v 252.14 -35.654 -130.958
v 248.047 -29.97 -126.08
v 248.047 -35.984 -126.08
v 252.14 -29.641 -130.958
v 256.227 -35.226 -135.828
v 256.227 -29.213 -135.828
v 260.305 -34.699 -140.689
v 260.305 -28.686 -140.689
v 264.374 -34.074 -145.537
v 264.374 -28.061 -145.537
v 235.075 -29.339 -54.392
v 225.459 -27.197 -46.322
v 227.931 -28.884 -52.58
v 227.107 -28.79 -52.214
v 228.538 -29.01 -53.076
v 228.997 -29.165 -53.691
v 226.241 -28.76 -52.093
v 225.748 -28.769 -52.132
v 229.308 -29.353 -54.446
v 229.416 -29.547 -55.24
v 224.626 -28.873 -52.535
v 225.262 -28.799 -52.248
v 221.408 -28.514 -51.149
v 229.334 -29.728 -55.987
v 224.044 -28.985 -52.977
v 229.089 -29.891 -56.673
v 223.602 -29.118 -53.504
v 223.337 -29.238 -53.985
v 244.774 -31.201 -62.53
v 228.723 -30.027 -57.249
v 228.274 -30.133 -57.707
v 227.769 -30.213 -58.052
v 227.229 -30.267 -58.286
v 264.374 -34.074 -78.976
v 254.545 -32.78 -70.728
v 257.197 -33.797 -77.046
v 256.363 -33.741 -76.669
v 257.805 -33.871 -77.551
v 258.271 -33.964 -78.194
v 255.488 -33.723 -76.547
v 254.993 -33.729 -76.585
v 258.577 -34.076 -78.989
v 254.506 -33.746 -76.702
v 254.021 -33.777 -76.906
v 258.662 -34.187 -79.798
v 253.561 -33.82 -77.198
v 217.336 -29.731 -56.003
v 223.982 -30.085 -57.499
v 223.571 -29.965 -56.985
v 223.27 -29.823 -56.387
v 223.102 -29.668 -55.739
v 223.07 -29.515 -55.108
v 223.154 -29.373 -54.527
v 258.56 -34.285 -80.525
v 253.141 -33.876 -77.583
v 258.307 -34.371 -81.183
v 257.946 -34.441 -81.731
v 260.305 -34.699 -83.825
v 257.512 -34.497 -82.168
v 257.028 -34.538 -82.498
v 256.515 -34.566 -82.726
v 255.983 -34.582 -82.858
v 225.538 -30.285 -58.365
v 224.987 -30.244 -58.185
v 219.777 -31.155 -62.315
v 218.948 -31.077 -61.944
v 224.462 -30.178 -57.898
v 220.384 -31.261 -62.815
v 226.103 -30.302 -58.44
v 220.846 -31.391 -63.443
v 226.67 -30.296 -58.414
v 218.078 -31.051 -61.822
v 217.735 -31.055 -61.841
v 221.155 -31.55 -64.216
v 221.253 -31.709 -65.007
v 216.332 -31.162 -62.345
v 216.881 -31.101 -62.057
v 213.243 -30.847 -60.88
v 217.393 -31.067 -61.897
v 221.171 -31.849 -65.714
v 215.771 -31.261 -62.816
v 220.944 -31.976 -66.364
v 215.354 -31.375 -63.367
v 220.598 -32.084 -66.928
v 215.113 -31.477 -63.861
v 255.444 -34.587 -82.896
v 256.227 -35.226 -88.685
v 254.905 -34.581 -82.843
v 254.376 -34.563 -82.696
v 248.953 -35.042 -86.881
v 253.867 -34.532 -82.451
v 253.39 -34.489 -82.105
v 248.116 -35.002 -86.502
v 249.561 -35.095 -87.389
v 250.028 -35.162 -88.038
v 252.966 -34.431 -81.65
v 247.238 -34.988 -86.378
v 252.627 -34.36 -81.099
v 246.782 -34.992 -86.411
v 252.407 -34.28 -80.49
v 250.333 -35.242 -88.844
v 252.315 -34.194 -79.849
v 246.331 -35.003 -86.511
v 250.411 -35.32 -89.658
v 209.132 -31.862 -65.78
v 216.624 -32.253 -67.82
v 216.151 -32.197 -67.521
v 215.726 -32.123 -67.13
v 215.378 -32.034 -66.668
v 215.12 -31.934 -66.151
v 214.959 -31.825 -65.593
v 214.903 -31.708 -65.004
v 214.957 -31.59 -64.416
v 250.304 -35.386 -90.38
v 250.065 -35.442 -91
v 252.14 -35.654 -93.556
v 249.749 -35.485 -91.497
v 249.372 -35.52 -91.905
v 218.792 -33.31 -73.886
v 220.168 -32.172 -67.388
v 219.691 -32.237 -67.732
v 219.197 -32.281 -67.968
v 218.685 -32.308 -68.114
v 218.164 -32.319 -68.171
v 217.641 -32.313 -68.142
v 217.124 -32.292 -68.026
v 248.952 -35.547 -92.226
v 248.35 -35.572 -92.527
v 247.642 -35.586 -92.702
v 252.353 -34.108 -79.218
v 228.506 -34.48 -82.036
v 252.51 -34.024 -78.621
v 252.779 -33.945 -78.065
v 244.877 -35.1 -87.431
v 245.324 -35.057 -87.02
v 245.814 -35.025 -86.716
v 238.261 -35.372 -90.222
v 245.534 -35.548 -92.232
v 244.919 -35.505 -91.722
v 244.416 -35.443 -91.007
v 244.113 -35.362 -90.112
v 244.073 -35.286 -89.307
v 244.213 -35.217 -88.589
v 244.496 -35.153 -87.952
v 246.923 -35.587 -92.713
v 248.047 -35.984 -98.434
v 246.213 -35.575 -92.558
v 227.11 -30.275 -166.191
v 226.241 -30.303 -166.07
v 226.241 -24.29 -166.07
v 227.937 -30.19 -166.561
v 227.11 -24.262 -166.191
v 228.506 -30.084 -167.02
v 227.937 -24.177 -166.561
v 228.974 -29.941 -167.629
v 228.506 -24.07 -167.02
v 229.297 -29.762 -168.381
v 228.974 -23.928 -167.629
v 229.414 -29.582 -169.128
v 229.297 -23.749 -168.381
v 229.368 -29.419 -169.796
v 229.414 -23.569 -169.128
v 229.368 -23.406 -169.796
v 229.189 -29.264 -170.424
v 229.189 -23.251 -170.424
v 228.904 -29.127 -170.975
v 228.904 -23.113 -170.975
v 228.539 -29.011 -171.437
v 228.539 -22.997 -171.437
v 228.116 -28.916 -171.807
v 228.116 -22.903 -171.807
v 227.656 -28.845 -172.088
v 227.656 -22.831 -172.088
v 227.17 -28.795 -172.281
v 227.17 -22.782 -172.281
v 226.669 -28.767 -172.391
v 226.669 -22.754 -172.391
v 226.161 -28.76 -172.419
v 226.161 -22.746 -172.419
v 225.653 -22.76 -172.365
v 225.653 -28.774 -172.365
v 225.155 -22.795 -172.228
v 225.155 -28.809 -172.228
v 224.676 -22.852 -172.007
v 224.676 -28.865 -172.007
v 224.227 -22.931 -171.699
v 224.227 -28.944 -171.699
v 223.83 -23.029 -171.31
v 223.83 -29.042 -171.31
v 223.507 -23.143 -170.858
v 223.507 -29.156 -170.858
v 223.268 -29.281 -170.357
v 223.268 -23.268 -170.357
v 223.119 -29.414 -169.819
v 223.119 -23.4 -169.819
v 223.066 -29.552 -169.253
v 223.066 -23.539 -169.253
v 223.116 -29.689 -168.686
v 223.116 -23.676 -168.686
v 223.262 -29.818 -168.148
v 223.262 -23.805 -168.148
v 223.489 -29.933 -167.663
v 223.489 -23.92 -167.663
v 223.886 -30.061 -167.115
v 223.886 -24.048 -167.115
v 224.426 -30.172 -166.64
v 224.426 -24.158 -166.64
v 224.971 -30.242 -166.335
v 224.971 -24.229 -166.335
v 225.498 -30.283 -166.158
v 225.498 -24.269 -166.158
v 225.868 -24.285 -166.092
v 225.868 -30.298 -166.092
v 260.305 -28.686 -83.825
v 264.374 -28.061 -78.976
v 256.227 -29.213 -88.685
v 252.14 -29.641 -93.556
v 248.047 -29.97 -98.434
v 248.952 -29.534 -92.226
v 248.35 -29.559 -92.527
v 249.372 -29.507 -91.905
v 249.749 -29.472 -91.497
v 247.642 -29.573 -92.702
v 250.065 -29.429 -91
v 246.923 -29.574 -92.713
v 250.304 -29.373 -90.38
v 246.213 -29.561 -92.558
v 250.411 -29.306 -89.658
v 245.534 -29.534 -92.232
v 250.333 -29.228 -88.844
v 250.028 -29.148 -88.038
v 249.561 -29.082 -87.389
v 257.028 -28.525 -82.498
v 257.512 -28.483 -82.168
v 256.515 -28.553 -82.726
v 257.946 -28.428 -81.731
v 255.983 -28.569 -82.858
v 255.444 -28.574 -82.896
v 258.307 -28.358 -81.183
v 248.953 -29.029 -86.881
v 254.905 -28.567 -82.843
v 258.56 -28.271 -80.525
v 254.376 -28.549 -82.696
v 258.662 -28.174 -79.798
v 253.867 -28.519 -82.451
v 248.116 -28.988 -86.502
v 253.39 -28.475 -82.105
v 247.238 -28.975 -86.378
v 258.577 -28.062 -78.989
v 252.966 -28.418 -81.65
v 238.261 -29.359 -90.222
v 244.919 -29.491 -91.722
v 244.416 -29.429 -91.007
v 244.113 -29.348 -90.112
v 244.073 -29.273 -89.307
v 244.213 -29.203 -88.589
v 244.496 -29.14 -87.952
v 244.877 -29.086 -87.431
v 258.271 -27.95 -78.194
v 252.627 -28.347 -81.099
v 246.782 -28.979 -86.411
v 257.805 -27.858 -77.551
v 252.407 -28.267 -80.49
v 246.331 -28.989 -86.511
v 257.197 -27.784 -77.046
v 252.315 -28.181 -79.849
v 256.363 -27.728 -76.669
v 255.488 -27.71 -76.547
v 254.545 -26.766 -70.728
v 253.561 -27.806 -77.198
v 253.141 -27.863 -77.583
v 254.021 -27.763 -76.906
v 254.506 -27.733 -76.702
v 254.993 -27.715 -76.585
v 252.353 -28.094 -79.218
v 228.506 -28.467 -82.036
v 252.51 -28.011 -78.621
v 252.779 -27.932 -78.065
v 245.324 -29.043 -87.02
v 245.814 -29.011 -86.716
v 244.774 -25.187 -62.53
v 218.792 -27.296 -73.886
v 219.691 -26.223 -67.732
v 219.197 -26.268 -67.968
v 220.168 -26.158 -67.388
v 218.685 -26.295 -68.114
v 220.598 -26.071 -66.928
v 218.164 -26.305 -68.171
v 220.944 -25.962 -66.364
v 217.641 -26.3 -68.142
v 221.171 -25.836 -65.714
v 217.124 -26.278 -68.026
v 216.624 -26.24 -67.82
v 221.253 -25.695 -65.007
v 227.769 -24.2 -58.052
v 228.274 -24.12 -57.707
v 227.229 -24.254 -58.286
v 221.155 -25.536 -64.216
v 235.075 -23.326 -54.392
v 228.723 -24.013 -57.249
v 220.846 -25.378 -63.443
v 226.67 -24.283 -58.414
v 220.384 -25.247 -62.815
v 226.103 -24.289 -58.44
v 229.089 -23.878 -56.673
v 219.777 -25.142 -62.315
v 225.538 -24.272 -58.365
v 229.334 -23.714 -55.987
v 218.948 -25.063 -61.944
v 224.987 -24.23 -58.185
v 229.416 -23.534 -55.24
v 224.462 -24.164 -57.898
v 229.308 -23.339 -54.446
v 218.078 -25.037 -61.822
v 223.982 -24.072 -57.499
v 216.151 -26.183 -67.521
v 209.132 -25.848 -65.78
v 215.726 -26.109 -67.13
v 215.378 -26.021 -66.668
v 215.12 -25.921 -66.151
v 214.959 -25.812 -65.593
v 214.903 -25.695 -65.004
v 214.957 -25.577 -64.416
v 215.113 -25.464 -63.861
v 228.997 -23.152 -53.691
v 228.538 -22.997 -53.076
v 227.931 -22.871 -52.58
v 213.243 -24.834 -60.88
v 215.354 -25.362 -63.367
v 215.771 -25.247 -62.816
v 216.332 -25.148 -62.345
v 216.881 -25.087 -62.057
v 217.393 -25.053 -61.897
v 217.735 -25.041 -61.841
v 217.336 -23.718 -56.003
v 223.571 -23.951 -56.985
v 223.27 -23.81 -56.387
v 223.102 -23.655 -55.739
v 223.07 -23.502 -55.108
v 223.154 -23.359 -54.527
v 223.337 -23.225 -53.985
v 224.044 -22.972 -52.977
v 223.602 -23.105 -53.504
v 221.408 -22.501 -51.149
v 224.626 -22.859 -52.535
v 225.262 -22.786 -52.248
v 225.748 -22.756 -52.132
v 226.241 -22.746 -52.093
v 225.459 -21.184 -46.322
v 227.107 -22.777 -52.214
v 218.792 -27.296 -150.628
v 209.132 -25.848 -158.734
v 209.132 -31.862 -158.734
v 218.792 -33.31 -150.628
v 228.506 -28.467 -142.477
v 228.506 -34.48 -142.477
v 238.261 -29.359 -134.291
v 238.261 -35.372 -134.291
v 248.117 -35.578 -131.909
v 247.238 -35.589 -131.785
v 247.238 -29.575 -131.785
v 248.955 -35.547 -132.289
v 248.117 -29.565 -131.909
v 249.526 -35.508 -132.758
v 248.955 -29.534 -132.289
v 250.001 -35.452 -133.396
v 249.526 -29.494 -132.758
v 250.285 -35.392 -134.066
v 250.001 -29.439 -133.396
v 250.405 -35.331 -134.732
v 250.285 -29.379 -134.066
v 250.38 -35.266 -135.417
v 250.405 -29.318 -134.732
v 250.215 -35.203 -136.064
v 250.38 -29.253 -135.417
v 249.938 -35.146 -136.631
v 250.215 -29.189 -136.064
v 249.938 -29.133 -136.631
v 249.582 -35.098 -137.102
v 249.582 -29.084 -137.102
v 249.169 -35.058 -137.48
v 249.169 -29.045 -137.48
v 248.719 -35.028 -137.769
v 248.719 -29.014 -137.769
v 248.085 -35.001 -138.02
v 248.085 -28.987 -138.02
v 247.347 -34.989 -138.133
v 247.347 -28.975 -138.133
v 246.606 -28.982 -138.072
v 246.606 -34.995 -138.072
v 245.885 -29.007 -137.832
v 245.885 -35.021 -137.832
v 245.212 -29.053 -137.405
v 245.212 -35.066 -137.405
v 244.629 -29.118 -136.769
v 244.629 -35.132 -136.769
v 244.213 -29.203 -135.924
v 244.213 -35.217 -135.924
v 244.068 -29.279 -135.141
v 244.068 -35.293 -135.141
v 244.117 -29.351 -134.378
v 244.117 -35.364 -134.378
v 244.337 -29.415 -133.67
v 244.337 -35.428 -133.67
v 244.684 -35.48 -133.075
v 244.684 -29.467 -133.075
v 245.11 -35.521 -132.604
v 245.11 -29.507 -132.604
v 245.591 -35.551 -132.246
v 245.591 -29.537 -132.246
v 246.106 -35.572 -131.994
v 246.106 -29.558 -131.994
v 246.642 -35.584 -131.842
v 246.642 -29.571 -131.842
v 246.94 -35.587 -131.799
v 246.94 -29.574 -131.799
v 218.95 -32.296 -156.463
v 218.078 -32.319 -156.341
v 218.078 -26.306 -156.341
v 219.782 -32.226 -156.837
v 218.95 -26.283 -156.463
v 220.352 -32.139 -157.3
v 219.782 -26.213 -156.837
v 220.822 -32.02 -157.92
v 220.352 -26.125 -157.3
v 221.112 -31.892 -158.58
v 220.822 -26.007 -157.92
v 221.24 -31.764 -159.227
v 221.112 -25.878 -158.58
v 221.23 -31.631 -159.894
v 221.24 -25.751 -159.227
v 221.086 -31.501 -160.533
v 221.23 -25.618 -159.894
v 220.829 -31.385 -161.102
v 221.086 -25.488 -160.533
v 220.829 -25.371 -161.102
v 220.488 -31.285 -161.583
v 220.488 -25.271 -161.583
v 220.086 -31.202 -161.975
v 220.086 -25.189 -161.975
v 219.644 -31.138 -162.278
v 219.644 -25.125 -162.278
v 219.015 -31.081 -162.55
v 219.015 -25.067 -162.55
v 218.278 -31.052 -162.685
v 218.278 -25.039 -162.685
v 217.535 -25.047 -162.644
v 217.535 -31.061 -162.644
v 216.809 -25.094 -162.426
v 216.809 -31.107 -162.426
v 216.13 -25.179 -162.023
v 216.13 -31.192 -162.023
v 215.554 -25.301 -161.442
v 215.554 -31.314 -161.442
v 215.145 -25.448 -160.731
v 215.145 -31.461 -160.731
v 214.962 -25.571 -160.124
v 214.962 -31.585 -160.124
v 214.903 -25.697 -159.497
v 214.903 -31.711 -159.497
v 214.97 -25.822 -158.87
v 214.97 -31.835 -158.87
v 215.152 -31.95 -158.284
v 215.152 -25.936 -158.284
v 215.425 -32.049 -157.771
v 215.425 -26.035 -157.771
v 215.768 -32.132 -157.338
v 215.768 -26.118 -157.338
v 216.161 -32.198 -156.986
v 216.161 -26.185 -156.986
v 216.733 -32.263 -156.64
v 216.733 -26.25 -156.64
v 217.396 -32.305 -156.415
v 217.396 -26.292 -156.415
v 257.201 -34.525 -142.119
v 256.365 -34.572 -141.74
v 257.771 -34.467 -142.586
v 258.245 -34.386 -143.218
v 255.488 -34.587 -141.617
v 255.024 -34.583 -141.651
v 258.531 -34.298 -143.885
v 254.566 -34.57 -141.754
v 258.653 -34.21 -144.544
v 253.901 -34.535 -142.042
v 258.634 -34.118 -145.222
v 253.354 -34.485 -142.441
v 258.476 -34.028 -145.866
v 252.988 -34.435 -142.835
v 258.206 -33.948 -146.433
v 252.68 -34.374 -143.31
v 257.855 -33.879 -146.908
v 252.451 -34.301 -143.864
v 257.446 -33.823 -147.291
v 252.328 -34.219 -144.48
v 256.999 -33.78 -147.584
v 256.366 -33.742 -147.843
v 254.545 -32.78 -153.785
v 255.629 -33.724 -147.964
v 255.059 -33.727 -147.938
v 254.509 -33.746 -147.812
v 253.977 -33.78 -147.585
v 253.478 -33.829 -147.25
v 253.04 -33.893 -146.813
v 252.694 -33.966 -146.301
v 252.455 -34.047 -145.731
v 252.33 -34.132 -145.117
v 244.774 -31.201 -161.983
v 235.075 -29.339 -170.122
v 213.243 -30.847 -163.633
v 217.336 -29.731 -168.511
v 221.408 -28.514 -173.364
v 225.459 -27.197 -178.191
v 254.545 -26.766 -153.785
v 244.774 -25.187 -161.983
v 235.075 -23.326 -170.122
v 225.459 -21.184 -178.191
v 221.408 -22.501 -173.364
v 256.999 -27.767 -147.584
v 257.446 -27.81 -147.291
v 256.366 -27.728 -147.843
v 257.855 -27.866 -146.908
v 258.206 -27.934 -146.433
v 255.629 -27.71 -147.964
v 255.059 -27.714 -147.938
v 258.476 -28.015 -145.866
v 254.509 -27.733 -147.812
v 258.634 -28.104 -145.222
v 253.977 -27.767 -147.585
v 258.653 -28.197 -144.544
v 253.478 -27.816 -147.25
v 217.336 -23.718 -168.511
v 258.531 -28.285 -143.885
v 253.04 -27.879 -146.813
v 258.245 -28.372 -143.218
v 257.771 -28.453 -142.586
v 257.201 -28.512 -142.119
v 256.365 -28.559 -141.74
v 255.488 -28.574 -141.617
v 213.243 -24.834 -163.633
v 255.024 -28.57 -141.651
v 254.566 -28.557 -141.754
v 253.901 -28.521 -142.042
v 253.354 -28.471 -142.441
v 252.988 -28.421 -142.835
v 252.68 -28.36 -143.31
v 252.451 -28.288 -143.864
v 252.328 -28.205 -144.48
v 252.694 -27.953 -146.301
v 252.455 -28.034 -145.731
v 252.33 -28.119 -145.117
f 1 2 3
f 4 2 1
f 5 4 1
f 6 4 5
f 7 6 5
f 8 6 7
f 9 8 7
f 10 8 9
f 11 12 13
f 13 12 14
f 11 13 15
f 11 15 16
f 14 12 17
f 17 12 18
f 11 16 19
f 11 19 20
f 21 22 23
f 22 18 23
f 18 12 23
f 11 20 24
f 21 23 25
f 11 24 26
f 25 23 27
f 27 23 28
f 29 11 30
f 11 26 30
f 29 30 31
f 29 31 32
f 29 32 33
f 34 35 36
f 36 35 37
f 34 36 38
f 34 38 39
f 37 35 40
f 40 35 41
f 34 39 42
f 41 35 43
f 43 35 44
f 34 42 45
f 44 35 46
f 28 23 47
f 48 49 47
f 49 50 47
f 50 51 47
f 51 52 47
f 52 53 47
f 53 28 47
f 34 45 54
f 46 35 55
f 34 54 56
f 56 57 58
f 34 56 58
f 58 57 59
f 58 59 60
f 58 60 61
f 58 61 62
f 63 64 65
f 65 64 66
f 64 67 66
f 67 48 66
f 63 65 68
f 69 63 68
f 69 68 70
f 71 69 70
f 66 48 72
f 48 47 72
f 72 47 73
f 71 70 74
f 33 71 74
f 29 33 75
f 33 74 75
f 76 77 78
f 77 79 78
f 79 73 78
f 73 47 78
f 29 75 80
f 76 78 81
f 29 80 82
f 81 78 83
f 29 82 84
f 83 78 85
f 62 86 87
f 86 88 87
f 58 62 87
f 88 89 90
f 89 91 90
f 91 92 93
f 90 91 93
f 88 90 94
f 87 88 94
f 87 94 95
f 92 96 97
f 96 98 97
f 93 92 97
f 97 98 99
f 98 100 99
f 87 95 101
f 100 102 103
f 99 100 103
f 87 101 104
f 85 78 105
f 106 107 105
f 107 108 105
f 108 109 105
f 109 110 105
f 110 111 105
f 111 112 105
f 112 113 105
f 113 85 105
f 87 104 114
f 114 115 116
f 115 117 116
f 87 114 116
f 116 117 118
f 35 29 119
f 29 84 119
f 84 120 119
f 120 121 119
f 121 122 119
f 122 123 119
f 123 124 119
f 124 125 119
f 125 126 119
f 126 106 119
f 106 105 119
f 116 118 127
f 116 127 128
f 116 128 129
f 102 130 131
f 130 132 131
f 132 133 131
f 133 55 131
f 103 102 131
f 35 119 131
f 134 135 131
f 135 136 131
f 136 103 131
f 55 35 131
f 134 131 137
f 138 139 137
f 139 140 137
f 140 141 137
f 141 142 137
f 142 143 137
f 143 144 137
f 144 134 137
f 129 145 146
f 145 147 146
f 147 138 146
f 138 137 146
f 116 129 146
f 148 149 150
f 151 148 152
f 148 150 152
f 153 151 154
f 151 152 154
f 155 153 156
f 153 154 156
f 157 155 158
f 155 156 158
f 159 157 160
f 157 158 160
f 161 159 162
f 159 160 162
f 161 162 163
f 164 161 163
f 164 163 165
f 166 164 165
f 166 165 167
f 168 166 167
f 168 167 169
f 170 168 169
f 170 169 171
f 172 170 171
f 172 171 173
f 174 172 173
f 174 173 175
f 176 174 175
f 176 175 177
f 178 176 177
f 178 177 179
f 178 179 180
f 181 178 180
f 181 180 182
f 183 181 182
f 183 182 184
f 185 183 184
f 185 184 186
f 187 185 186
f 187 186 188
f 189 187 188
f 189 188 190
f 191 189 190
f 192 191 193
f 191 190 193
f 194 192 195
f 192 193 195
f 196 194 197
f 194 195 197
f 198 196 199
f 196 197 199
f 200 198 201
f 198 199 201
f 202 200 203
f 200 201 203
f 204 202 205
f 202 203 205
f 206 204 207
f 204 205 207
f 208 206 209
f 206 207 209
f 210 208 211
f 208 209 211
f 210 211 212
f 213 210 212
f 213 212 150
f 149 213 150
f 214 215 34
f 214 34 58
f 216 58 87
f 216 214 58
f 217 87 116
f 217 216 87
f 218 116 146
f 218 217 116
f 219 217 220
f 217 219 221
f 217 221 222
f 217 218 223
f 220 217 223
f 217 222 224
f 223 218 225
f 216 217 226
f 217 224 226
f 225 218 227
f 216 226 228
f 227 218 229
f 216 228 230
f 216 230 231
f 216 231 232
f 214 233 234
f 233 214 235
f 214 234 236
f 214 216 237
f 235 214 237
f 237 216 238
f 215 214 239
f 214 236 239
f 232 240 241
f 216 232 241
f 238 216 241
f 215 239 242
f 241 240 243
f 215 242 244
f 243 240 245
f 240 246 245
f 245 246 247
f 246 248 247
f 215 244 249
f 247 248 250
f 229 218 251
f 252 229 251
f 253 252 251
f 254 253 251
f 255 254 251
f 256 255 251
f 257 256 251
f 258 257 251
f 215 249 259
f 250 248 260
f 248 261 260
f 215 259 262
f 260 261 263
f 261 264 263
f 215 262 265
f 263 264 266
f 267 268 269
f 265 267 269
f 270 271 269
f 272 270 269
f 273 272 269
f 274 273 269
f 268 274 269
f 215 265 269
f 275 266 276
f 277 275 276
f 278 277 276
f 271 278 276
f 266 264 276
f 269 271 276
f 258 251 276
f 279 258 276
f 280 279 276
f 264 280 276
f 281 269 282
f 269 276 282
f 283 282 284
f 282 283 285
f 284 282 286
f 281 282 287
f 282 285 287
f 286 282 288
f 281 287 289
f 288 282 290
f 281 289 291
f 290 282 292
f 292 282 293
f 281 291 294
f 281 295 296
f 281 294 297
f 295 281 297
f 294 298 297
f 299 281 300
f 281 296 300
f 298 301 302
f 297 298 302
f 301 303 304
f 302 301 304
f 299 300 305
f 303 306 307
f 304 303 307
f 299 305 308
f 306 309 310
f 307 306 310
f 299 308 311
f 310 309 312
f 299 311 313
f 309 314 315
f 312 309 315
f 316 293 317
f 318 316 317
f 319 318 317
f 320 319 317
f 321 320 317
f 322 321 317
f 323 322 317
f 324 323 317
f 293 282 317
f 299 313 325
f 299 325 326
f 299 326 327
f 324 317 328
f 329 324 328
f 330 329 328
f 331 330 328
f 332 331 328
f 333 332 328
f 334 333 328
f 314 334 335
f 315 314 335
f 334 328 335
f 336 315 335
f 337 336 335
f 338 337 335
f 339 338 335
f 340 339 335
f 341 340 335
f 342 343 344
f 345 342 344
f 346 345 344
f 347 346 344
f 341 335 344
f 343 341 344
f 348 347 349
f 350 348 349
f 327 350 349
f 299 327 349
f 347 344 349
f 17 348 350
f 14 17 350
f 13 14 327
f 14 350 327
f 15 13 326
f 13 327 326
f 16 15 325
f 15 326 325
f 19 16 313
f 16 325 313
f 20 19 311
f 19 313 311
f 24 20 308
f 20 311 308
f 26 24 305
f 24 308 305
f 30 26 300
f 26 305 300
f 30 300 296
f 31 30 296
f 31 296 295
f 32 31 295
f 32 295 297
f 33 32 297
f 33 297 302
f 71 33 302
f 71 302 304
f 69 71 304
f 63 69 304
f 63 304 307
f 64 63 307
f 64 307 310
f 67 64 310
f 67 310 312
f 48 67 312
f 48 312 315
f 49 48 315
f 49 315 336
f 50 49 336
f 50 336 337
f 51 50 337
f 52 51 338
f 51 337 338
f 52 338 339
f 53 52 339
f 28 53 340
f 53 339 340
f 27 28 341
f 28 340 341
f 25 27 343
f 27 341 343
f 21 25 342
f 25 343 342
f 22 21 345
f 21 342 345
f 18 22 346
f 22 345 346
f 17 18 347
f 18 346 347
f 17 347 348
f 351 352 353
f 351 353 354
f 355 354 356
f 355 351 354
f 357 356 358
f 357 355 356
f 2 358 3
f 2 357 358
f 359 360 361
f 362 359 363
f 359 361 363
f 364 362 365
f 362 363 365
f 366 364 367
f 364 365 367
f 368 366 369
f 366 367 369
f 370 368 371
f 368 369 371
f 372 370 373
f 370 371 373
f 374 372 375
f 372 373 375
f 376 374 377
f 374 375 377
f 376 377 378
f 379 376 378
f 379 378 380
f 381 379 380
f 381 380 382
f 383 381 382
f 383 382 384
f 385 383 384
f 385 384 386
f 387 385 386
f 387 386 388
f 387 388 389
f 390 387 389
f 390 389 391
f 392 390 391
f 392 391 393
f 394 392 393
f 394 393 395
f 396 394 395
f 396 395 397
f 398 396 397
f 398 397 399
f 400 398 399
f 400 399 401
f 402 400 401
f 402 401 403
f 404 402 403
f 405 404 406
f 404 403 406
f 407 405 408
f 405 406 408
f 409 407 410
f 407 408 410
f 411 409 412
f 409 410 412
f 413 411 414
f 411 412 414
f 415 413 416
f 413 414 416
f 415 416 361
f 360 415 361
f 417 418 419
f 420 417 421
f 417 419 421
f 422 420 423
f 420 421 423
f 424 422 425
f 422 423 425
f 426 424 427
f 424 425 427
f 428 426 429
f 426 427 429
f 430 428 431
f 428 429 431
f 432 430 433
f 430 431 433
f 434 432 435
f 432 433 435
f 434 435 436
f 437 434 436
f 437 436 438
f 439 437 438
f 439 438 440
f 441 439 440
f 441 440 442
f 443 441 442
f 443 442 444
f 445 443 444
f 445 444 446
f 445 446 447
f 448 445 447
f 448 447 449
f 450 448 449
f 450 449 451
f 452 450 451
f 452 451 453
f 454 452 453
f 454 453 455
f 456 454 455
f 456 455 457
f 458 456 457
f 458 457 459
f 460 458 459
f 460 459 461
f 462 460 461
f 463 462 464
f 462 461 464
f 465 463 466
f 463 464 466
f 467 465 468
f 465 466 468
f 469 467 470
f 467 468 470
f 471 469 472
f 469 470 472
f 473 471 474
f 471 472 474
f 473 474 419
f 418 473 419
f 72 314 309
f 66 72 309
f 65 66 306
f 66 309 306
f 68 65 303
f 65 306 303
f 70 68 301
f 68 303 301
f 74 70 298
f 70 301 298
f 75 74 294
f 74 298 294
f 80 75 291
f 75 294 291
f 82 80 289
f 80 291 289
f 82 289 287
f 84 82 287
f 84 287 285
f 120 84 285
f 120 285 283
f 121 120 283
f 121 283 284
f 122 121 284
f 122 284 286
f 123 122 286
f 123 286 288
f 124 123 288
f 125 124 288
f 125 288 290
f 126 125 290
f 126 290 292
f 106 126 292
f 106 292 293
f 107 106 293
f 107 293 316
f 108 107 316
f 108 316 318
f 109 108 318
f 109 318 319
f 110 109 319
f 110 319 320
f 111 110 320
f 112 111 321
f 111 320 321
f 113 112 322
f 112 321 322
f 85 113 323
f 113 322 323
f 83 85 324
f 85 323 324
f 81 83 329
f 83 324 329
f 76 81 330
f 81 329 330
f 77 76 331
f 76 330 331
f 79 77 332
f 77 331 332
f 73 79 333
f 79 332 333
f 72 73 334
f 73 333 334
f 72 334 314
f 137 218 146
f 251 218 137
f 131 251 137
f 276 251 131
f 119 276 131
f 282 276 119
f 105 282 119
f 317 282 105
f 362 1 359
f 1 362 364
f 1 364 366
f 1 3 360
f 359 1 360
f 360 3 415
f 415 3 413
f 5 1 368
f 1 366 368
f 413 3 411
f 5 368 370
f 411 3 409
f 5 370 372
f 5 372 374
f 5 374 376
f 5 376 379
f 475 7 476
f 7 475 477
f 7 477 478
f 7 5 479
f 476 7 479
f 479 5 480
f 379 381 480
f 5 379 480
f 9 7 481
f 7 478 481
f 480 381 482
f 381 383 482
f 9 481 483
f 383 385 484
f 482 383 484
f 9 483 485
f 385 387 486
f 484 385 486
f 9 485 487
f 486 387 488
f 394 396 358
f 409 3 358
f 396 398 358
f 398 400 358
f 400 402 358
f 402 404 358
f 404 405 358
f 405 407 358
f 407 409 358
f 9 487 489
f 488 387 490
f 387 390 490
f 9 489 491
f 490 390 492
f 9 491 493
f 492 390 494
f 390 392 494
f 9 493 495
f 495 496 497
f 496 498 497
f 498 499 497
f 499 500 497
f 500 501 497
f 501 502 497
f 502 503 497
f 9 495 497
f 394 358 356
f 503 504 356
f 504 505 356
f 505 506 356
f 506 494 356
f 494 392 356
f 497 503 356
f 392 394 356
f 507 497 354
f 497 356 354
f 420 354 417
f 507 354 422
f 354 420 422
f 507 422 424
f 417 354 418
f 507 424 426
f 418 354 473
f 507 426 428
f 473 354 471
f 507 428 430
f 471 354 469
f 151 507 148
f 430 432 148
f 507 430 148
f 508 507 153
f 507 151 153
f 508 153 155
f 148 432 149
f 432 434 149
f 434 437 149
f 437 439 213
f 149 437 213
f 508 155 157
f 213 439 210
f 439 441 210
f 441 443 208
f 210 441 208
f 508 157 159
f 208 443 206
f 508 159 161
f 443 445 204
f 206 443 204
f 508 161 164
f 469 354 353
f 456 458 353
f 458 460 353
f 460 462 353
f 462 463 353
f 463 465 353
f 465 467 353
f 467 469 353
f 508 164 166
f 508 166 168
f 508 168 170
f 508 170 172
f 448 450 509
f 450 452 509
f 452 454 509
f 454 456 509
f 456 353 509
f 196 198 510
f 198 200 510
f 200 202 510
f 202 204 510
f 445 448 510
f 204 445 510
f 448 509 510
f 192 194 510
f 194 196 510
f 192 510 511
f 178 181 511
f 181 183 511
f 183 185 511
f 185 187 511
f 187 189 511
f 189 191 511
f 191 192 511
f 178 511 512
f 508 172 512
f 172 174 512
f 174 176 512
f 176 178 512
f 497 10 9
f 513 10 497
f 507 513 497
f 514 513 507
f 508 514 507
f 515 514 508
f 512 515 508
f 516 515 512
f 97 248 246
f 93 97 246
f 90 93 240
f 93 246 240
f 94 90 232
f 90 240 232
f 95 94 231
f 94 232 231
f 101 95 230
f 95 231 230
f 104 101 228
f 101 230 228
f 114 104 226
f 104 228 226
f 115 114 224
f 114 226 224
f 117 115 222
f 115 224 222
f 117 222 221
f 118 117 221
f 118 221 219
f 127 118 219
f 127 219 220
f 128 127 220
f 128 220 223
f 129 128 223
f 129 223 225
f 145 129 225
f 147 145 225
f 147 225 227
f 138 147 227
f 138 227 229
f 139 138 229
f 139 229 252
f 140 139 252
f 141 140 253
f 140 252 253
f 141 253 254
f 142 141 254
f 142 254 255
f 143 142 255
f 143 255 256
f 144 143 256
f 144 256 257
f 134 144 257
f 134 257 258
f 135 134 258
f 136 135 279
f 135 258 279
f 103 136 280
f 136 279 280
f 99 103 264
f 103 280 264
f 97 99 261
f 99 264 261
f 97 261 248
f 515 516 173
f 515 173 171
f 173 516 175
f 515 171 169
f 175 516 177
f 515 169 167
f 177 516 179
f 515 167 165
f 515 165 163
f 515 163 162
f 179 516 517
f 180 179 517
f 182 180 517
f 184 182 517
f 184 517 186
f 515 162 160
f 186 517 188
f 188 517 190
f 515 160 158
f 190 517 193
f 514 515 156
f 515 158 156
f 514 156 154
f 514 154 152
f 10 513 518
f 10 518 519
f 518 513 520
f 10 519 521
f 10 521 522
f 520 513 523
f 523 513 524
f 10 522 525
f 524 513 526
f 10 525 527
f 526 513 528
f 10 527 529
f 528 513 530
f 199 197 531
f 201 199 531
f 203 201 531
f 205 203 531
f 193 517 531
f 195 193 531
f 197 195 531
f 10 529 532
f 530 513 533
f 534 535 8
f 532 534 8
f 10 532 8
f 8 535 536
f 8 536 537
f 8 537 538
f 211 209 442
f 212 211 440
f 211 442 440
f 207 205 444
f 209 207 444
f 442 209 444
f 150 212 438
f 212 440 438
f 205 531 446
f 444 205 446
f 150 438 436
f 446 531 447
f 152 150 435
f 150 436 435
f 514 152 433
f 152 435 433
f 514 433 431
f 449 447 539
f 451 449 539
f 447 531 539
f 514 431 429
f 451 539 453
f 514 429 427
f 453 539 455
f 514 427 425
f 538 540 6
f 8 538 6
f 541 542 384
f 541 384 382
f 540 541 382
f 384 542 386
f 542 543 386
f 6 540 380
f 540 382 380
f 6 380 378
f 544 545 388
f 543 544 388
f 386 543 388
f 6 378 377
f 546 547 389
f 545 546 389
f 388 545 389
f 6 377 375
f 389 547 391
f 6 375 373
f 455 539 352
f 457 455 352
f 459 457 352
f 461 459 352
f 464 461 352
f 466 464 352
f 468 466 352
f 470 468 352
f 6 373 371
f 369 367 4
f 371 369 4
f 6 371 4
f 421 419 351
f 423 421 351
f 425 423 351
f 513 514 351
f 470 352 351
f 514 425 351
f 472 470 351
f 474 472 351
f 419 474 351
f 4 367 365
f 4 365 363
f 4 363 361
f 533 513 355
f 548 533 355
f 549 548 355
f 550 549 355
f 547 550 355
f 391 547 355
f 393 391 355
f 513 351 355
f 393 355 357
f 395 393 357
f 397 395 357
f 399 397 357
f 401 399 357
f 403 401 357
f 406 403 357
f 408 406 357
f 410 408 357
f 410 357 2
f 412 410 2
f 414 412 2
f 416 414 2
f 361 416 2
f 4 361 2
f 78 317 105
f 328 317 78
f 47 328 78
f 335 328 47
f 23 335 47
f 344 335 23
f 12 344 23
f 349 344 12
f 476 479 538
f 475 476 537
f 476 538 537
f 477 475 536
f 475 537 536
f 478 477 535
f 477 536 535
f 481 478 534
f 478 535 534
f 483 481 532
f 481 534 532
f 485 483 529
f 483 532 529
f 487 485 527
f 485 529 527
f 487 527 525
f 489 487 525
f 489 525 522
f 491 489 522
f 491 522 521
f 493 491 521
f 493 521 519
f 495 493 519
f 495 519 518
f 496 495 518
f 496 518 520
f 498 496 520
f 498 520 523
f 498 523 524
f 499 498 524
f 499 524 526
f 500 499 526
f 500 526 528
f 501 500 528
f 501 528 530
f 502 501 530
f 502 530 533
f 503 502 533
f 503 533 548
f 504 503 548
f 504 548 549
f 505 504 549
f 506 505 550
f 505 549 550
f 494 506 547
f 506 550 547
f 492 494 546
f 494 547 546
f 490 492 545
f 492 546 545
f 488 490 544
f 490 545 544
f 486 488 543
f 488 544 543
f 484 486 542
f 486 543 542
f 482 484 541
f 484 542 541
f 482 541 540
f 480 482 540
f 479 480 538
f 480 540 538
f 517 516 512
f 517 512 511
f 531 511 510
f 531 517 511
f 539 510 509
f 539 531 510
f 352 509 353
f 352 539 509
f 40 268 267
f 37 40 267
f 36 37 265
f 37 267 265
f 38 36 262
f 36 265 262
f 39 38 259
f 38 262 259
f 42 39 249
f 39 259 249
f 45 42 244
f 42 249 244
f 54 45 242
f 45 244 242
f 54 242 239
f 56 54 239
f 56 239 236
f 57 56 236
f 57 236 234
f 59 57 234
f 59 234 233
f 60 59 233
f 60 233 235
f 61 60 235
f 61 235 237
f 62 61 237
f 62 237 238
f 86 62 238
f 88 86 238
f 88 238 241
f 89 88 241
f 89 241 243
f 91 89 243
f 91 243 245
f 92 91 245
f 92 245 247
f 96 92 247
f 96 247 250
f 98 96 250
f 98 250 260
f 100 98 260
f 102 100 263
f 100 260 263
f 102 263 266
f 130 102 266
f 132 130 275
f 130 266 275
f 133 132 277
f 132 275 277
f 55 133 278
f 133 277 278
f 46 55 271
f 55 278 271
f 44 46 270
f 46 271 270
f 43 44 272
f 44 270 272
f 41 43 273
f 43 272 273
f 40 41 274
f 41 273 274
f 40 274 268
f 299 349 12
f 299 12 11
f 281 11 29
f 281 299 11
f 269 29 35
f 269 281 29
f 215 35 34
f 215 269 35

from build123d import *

# Parameters (mm, degrees)
BOSS_EXTRUDE4_DEPTH = 304.8
SKETCH4_W           = 120.367414929
SKETCH4_H           = 199.720747733
CUT_EXTRUDE20_DEPTH = 200
SKETCH4_17_R        = 3.175
CUT_EXTRUDE21_DEPTH = 200


with BuildPart() as part:
    # Sketch3 → Boss-Extrude4 (new body)
    with BuildSketch(Plane(origin=(0, 0, 0), x_dir=(0, 0, -1), z_dir=(1, 0, 0))):
        with BuildLine():
            ThreePointArc((232.90669496, 1.961354585), (112.25669496, -30.366715482), (-8.39330504, 1.961354585))
            Line((-8.39330504, 1.961354585), (-8.39330504, -4.052041589))
            ThreePointArc((-8.39330504, -4.052041589), (112.25669496, -36.380111656), (232.90669496, -4.052041589))
            Line((232.90669496, -4.052041589), (232.90669496, 1.961354585))
        make_face()
    extrude(amount=BOSS_EXTRUDE4_DEPTH)

    # Sketch4 → Cut-Extrude20 (cut)
    with BuildSketch(Plane(origin=(0, 1.961354585, 0), x_dir=(1, 0, 0), z_dir=(0, 1, 0))):
        with Locations((227.963988261, 108.244447796)):
            Rectangle(SKETCH4_W, SKETCH4_H)
        Polygon((264.373807825, 78.97597139), (225.458750115, 46.322360818), (214.460227487, 59.429889674), (209.131944829, 65.779889674), (213.996327043, 69.861590995), (248.047002539, 98.433500246), align=None, mode=Mode.SUBTRACT)
        Polygon((248.047002539, 126.079889674), (209.131944829, 158.733500246), (225.458750115, 178.191029101), (264.373807825, 145.537418529), align=None, mode=Mode.SUBTRACT)
    extrude(amount=-CUT_EXTRUDE20_DEPTH, mode=Mode.SUBTRACT)


with BuildPart() as cut_extrude20_piece_1:
    # of the separate pieces the step leaves, piece 1, a body of its own (cut_extrude20_pieces_kept)
    add(part.part.solids().sort_by_distance((225.458750115, -21.183827263, -178.191029101))[0])


with BuildPart() as cut_extrude20_piece_2:
    # of the separate pieces the step leaves, piece 2, a body of its own (cut_extrude20_pieces_kept)
    add(part.part.solids().sort_by_distance((209.131944829, -25.848464294, -65.779889674))[0])


with BuildPart() as cut_extrude21_tool:
    # Sketch4<17> → Cut-Extrude21 (new body)
    with BuildSketch(Plane(origin=(0, 1.961354585, 0), x_dir=(1, 0, 0), z_dir=(0, 1, 0))):
        with Locations((218.078028364, 64.997208781)):
            Circle(SKETCH4_17_R)
        with Locations((247.238208457, 89.553149912)):
            Circle(SKETCH4_17_R)
        with Locations((226.241431007, 55.268444354)):
            Circle(SKETCH4_17_R)
        with Locations((255.487924349, 79.72152136)):
            Circle(SKETCH4_17_R)
        with Locations((226.241431007, 169.244945565)):
            Circle(SKETCH4_17_R)
        with Locations((255.487924349, 144.791868559)):
            Circle(SKETCH4_17_R)
        with Locations((218.078028364, 159.516181138)):
            Circle(SKETCH4_17_R)
        with Locations((247.238208457, 134.960240007)):
            Circle(SKETCH4_17_R)
    extrude(amount=-CUT_EXTRUDE21_DEPTH)


with BuildPart() as cut_extrude20_piece_1_1:
    add(cut_extrude20_piece_1.part)

    # Cut-Extrude21: cut by cut_extrude21_tool
    add(cut_extrude21_tool.part, mode=Mode.SUBTRACT)


with BuildPart() as cut_extrude20_piece_2_1:
    add(cut_extrude20_piece_2.part)

    # Cut-Extrude21: cut by cut_extrude21_tool
    add(cut_extrude21_tool.part, mode=Mode.SUBTRACT)


solid = Compound([cut_extrude20_piece_1_1.part, cut_extrude20_piece_2_1.part])
